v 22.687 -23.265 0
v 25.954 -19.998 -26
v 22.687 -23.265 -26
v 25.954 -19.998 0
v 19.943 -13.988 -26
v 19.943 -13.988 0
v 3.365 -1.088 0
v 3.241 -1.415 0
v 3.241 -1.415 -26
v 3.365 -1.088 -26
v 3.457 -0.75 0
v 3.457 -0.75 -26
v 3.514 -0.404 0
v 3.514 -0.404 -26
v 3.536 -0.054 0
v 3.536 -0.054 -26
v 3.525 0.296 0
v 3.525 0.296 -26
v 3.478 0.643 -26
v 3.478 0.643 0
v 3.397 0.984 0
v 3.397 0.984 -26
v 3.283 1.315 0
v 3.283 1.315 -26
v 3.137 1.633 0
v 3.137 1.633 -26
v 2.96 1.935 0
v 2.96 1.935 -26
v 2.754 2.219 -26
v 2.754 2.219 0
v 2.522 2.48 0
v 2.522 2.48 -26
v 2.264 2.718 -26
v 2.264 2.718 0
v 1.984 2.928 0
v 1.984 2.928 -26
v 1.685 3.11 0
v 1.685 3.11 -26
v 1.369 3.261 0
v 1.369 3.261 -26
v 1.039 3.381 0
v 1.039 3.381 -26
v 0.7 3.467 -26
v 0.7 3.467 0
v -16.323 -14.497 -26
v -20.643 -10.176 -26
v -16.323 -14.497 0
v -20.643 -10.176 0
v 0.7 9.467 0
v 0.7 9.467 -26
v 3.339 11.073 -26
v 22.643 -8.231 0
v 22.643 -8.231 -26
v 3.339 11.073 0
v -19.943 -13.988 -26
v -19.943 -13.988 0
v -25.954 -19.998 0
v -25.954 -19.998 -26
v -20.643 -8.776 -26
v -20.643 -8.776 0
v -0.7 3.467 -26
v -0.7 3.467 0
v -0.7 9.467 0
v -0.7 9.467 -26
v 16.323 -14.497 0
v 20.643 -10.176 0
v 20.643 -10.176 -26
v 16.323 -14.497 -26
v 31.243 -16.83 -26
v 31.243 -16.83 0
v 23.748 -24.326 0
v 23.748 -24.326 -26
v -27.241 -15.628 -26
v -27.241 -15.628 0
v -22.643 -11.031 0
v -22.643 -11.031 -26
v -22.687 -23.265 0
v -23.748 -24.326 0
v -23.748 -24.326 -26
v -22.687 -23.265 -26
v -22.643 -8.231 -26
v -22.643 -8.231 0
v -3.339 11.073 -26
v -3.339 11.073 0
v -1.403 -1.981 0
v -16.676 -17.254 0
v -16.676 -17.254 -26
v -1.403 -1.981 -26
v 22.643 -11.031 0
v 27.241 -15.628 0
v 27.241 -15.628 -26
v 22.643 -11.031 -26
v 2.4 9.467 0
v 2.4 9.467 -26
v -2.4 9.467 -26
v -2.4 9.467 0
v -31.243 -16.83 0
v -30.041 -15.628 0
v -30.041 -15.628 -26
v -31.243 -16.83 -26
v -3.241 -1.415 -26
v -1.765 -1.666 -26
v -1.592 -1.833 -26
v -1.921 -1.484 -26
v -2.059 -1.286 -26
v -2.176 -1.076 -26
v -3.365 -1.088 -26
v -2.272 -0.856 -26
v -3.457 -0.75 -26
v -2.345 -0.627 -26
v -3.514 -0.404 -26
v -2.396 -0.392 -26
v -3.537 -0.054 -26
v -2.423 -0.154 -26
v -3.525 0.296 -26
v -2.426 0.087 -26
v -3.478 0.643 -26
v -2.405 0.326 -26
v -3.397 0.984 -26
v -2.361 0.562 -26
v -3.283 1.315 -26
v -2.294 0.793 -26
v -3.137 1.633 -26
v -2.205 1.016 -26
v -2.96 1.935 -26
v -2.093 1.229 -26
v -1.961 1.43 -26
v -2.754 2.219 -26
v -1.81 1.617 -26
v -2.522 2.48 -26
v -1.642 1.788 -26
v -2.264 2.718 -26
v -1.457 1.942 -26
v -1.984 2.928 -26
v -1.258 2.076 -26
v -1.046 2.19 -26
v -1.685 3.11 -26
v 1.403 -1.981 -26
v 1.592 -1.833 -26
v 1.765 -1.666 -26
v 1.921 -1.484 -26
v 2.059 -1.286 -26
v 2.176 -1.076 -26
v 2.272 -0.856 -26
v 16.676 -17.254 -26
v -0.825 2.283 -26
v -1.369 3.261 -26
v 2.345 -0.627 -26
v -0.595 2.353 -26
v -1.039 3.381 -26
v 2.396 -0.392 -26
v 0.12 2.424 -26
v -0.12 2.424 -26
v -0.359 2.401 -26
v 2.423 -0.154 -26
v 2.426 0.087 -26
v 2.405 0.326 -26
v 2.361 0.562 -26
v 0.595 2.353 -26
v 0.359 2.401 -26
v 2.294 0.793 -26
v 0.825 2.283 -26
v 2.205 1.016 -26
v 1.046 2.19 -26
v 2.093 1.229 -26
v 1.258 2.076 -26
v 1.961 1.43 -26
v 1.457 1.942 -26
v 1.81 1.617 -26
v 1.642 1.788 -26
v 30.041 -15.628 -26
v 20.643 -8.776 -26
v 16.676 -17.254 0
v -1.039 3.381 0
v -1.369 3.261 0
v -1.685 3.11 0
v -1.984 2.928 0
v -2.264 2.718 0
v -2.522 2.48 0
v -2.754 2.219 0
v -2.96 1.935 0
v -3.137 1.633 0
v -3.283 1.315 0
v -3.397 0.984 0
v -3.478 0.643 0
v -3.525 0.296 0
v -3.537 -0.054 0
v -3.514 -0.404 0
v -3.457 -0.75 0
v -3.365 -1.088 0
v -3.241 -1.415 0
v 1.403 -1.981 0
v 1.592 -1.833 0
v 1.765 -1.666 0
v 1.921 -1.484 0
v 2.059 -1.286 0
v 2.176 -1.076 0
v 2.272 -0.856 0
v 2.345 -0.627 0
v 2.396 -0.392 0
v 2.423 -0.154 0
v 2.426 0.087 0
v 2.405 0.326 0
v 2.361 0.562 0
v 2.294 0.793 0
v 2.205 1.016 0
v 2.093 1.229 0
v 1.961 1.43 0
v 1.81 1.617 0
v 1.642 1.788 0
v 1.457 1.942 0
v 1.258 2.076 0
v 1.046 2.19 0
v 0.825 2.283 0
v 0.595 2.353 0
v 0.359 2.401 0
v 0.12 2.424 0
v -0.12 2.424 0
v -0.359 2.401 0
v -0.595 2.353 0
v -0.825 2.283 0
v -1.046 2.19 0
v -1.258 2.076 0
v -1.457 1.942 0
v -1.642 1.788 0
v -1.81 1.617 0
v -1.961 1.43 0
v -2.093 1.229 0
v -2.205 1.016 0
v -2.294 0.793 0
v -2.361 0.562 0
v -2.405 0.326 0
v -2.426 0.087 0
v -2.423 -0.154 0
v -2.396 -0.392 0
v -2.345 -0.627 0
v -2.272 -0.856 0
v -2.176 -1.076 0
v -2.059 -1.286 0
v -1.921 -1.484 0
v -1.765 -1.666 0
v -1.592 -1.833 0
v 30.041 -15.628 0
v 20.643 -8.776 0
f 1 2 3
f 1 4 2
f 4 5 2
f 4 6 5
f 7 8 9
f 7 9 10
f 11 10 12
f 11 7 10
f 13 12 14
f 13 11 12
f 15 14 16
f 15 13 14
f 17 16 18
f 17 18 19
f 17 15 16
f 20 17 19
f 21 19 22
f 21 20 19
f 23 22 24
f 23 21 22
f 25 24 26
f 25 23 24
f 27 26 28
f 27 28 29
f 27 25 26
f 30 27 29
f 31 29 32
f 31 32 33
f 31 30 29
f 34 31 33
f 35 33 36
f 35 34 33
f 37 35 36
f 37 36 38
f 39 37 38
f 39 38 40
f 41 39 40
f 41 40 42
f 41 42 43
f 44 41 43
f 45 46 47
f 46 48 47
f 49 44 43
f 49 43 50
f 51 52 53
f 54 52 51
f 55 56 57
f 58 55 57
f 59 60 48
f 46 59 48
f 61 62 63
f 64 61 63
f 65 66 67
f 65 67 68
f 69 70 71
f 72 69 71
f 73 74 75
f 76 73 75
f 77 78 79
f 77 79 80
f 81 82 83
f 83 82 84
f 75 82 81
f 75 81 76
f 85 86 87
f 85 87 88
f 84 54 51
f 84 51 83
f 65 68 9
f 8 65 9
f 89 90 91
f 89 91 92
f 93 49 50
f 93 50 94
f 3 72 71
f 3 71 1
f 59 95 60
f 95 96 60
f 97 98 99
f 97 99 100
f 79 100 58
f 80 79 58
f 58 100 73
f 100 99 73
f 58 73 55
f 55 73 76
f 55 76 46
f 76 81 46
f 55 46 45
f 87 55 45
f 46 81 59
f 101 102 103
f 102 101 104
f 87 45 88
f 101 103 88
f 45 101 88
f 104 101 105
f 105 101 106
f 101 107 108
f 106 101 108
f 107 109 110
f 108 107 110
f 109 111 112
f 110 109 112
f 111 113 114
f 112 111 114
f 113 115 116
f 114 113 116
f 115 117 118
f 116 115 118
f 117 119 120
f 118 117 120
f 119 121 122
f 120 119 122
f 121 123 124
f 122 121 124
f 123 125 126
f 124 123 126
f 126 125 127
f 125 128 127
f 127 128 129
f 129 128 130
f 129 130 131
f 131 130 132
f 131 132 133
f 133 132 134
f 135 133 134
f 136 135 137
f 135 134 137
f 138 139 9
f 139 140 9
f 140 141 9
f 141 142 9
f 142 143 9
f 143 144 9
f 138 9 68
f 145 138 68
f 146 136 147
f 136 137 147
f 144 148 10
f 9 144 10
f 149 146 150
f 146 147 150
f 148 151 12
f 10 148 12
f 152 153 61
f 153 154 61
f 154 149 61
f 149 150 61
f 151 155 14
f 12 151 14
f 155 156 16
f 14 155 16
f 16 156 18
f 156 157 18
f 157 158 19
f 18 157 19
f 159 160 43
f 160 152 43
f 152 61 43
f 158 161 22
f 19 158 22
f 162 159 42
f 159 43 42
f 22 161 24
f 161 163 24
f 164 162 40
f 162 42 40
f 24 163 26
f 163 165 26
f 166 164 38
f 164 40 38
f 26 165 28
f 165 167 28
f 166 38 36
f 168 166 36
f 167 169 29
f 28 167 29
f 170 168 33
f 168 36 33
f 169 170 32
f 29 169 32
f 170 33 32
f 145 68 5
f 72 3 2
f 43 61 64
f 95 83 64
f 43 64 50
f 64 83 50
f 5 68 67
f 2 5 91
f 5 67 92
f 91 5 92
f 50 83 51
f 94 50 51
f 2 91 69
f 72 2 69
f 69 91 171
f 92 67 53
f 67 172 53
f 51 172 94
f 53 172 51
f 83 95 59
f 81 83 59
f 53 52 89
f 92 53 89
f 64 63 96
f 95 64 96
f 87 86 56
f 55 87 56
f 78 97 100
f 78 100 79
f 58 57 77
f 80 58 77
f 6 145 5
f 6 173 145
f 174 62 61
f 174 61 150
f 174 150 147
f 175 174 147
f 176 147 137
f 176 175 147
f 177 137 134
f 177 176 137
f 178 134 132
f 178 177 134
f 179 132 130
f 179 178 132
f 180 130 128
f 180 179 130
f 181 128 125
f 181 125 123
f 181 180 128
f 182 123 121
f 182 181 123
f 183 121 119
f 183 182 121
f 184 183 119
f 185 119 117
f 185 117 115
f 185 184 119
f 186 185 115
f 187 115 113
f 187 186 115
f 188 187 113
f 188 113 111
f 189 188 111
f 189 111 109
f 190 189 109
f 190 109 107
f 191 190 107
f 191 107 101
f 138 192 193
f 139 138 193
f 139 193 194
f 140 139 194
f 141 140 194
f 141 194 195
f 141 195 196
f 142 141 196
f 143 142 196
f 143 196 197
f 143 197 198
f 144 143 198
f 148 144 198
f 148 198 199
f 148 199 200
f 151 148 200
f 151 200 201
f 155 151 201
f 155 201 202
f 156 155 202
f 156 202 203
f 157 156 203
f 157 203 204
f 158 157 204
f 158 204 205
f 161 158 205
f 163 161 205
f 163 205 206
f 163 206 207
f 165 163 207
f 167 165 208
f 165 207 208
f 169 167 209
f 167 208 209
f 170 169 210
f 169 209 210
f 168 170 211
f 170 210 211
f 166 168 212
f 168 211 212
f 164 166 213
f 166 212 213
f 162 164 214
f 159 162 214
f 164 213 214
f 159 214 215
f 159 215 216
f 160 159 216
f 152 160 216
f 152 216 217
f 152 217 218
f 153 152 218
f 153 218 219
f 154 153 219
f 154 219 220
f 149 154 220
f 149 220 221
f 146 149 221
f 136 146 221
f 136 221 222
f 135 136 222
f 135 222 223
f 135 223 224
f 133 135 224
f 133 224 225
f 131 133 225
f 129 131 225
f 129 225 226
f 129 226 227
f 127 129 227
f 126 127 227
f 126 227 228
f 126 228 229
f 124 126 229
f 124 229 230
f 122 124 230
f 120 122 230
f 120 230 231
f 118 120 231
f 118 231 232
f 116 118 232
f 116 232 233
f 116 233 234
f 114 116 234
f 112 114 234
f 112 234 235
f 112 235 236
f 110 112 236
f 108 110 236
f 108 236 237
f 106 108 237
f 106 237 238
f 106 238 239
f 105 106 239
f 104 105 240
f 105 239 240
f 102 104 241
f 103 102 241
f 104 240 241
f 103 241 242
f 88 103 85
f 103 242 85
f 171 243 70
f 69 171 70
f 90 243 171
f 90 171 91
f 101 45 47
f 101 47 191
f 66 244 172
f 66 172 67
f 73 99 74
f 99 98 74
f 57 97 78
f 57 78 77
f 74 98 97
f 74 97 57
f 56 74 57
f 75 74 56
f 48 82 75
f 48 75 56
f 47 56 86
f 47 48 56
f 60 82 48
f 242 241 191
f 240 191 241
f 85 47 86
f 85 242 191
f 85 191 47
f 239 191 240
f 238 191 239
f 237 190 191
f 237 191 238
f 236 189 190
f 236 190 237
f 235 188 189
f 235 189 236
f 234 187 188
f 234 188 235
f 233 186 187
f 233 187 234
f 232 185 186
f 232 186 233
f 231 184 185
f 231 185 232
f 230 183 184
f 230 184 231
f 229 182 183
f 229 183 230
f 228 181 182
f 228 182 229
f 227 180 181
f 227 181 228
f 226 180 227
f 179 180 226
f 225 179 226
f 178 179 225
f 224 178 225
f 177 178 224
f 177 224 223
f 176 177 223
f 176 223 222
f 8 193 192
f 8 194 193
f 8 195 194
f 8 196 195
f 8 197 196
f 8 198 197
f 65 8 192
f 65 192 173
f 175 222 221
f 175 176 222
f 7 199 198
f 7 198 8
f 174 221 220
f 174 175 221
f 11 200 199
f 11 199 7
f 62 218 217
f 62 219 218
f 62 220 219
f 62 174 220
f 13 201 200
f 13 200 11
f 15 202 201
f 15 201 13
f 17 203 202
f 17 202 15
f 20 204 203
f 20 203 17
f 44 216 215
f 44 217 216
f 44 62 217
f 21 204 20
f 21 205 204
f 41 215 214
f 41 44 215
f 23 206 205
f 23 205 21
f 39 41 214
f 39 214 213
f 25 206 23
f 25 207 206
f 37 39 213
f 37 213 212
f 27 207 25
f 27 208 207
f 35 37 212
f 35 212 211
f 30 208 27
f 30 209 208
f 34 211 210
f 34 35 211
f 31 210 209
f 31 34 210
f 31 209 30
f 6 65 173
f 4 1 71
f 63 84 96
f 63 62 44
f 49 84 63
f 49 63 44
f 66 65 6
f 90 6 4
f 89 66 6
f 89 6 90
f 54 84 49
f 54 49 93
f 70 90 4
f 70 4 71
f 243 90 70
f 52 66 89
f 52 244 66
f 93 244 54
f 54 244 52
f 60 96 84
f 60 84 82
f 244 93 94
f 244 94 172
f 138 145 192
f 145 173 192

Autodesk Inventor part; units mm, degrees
ref_plane "YZ Plane" through (0, 0, 0) normal (1, 0, 0) x (0, 1, 0)
ref_plane "XZ Plane" through (0, 0, 0) normal (0, 1, 0) x (-1, 0, 0)
ref_plane "XY Plane" through (0, 0, 0) normal (0, 0, 1) x (1, 0, 0)
sketch "Sketch1" plane through (0, 0, 0) normal (0, 0, 1) x (1, 0, 0)
  line L0 (-0.7, 9.467) -> (-2.4, 9.467)
  line L1 (-2.4, 9.467) -> (-20.6434, -8.7764)
  line L2 (-20.6434, -8.7764) -> (-20.6434, -10.1764)
  line L3 (-20.6434, -10.1764) -> (-16.3229, -14.4968)
  line L4 (-16.3229, -14.4968) -> (-3.2414, -1.4153)
  line L5 (-22.6434, -8.2308) -> (-3.3393, 11.0732)
  line L6 (-22.6434, -8.2308) -> (-22.6434, -11.0308)
  line L7 (-27.2408, -15.6282) -> (-22.6434, -11.0308)
  line L8 (-30.0408, -15.6282) -> (-31.2428, -16.8303)
  line L9 (-31.2428, -16.8303) -> (-23.7475, -24.3256)
  line L10 (-16.6765, -17.2545) -> (-19.9434, -13.9876)
  line L11 (-19.9434, -13.9876) -> (-25.9538, -19.998)
  line L12 (-25.9538, -19.998) -> (-22.6869, -23.2649)
  line L13 (-23.7475, -24.3256) -> (-22.6869, -23.2649)
  line L14 (-16.6765, -17.2545) -> (-1.4029, -1.981)
  line L15 (-30.0408, -15.6282) -> (-27.2408, -15.6282)
  line L16 (3.3393, 11.0732) -> (-3.3393, 11.0732)
  line L17 (-0.7, 3.467) -> (-0.7, 9.467)
  line L18 (0, 12.3968) -> (0, -27.803) construction
  line L19 (0.7, 9.467) -> (2.4, 9.467)
  line L20 (2.4, 9.467) -> (20.6434, -8.7764)
  line L21 (20.6434, -8.7764) -> (20.6434, -10.1764)
  line L22 (20.6434, -10.1764) -> (16.3229, -14.4968)
  line L23 (16.3229, -14.4968) -> (3.2414, -1.4153)
  line L24 (22.6434, -8.2308) -> (3.3393, 11.0732)
  line L25 (22.6434, -8.2308) -> (22.6434, -11.0308)
  line L26 (27.2408, -15.6282) -> (22.6434, -11.0308)
  line L27 (30.0408, -15.6282) -> (31.2428, -16.8303)
  line L28 (31.2428, -16.8303) -> (23.7475, -24.3256)
  line L29 (16.6765, -17.2545) -> (19.9434, -13.9876)
  line L30 (19.9434, -13.9876) -> (25.9538, -19.998)
  line L31 (25.9538, -19.998) -> (22.6869, -23.2649)
  line L32 (23.7475, -24.3256) -> (22.6869, -23.2649)
  line L33 (16.6765, -17.2545) -> (1.4029, -1.981)
  line L34 (30.0408, -15.6282) -> (27.2408, -15.6282)
  line L35 (0.7, 3.467) -> (0.7, 9.467)
  arc A0 (1.4029, -1.981) -> (-1.4029, -1.981) centre (0, 0) ccw
  arc A1 (3.2414, -1.4153) -> (0.7, 3.467) centre (0, 0) ccw
  arc A2 (-0.7, 3.467) -> (-3.2414, -1.4153) centre (0, 0) ccw
  dimension "d77" = 1.8
  dimension "d83" = 27.3
  dimension "d84" = 135
  dimension "d87" = 2.8
  dimension "d88" = 135
  dimension "d89" = 2.8
  dimension "d90" = 1.7
  dimension "d93" = 4
  dimension "d94" = 1.5
  dimension "d96" = 8.5
  dimension "d100" = 1.4
  dimension "d101" = 2.2
  dimension "d102" = 2
  dimension "d103" = 1.7
  dimension "d104" = 10.6
  dimension "d106" = 135
  dimension "d107" = 25.8
  dimension "d108" = 18.5
  dimension "d109" = 21.6
  dimension "d110" = 6
  dimension "d111" = 0.7
  dimension "d112" = 1.7
extrude "Extrusion1" add sketch "Sketch1" against normal blind 26
properties part number "BRA-12 ESCUADRA UNIÓN 45 10 mm"
